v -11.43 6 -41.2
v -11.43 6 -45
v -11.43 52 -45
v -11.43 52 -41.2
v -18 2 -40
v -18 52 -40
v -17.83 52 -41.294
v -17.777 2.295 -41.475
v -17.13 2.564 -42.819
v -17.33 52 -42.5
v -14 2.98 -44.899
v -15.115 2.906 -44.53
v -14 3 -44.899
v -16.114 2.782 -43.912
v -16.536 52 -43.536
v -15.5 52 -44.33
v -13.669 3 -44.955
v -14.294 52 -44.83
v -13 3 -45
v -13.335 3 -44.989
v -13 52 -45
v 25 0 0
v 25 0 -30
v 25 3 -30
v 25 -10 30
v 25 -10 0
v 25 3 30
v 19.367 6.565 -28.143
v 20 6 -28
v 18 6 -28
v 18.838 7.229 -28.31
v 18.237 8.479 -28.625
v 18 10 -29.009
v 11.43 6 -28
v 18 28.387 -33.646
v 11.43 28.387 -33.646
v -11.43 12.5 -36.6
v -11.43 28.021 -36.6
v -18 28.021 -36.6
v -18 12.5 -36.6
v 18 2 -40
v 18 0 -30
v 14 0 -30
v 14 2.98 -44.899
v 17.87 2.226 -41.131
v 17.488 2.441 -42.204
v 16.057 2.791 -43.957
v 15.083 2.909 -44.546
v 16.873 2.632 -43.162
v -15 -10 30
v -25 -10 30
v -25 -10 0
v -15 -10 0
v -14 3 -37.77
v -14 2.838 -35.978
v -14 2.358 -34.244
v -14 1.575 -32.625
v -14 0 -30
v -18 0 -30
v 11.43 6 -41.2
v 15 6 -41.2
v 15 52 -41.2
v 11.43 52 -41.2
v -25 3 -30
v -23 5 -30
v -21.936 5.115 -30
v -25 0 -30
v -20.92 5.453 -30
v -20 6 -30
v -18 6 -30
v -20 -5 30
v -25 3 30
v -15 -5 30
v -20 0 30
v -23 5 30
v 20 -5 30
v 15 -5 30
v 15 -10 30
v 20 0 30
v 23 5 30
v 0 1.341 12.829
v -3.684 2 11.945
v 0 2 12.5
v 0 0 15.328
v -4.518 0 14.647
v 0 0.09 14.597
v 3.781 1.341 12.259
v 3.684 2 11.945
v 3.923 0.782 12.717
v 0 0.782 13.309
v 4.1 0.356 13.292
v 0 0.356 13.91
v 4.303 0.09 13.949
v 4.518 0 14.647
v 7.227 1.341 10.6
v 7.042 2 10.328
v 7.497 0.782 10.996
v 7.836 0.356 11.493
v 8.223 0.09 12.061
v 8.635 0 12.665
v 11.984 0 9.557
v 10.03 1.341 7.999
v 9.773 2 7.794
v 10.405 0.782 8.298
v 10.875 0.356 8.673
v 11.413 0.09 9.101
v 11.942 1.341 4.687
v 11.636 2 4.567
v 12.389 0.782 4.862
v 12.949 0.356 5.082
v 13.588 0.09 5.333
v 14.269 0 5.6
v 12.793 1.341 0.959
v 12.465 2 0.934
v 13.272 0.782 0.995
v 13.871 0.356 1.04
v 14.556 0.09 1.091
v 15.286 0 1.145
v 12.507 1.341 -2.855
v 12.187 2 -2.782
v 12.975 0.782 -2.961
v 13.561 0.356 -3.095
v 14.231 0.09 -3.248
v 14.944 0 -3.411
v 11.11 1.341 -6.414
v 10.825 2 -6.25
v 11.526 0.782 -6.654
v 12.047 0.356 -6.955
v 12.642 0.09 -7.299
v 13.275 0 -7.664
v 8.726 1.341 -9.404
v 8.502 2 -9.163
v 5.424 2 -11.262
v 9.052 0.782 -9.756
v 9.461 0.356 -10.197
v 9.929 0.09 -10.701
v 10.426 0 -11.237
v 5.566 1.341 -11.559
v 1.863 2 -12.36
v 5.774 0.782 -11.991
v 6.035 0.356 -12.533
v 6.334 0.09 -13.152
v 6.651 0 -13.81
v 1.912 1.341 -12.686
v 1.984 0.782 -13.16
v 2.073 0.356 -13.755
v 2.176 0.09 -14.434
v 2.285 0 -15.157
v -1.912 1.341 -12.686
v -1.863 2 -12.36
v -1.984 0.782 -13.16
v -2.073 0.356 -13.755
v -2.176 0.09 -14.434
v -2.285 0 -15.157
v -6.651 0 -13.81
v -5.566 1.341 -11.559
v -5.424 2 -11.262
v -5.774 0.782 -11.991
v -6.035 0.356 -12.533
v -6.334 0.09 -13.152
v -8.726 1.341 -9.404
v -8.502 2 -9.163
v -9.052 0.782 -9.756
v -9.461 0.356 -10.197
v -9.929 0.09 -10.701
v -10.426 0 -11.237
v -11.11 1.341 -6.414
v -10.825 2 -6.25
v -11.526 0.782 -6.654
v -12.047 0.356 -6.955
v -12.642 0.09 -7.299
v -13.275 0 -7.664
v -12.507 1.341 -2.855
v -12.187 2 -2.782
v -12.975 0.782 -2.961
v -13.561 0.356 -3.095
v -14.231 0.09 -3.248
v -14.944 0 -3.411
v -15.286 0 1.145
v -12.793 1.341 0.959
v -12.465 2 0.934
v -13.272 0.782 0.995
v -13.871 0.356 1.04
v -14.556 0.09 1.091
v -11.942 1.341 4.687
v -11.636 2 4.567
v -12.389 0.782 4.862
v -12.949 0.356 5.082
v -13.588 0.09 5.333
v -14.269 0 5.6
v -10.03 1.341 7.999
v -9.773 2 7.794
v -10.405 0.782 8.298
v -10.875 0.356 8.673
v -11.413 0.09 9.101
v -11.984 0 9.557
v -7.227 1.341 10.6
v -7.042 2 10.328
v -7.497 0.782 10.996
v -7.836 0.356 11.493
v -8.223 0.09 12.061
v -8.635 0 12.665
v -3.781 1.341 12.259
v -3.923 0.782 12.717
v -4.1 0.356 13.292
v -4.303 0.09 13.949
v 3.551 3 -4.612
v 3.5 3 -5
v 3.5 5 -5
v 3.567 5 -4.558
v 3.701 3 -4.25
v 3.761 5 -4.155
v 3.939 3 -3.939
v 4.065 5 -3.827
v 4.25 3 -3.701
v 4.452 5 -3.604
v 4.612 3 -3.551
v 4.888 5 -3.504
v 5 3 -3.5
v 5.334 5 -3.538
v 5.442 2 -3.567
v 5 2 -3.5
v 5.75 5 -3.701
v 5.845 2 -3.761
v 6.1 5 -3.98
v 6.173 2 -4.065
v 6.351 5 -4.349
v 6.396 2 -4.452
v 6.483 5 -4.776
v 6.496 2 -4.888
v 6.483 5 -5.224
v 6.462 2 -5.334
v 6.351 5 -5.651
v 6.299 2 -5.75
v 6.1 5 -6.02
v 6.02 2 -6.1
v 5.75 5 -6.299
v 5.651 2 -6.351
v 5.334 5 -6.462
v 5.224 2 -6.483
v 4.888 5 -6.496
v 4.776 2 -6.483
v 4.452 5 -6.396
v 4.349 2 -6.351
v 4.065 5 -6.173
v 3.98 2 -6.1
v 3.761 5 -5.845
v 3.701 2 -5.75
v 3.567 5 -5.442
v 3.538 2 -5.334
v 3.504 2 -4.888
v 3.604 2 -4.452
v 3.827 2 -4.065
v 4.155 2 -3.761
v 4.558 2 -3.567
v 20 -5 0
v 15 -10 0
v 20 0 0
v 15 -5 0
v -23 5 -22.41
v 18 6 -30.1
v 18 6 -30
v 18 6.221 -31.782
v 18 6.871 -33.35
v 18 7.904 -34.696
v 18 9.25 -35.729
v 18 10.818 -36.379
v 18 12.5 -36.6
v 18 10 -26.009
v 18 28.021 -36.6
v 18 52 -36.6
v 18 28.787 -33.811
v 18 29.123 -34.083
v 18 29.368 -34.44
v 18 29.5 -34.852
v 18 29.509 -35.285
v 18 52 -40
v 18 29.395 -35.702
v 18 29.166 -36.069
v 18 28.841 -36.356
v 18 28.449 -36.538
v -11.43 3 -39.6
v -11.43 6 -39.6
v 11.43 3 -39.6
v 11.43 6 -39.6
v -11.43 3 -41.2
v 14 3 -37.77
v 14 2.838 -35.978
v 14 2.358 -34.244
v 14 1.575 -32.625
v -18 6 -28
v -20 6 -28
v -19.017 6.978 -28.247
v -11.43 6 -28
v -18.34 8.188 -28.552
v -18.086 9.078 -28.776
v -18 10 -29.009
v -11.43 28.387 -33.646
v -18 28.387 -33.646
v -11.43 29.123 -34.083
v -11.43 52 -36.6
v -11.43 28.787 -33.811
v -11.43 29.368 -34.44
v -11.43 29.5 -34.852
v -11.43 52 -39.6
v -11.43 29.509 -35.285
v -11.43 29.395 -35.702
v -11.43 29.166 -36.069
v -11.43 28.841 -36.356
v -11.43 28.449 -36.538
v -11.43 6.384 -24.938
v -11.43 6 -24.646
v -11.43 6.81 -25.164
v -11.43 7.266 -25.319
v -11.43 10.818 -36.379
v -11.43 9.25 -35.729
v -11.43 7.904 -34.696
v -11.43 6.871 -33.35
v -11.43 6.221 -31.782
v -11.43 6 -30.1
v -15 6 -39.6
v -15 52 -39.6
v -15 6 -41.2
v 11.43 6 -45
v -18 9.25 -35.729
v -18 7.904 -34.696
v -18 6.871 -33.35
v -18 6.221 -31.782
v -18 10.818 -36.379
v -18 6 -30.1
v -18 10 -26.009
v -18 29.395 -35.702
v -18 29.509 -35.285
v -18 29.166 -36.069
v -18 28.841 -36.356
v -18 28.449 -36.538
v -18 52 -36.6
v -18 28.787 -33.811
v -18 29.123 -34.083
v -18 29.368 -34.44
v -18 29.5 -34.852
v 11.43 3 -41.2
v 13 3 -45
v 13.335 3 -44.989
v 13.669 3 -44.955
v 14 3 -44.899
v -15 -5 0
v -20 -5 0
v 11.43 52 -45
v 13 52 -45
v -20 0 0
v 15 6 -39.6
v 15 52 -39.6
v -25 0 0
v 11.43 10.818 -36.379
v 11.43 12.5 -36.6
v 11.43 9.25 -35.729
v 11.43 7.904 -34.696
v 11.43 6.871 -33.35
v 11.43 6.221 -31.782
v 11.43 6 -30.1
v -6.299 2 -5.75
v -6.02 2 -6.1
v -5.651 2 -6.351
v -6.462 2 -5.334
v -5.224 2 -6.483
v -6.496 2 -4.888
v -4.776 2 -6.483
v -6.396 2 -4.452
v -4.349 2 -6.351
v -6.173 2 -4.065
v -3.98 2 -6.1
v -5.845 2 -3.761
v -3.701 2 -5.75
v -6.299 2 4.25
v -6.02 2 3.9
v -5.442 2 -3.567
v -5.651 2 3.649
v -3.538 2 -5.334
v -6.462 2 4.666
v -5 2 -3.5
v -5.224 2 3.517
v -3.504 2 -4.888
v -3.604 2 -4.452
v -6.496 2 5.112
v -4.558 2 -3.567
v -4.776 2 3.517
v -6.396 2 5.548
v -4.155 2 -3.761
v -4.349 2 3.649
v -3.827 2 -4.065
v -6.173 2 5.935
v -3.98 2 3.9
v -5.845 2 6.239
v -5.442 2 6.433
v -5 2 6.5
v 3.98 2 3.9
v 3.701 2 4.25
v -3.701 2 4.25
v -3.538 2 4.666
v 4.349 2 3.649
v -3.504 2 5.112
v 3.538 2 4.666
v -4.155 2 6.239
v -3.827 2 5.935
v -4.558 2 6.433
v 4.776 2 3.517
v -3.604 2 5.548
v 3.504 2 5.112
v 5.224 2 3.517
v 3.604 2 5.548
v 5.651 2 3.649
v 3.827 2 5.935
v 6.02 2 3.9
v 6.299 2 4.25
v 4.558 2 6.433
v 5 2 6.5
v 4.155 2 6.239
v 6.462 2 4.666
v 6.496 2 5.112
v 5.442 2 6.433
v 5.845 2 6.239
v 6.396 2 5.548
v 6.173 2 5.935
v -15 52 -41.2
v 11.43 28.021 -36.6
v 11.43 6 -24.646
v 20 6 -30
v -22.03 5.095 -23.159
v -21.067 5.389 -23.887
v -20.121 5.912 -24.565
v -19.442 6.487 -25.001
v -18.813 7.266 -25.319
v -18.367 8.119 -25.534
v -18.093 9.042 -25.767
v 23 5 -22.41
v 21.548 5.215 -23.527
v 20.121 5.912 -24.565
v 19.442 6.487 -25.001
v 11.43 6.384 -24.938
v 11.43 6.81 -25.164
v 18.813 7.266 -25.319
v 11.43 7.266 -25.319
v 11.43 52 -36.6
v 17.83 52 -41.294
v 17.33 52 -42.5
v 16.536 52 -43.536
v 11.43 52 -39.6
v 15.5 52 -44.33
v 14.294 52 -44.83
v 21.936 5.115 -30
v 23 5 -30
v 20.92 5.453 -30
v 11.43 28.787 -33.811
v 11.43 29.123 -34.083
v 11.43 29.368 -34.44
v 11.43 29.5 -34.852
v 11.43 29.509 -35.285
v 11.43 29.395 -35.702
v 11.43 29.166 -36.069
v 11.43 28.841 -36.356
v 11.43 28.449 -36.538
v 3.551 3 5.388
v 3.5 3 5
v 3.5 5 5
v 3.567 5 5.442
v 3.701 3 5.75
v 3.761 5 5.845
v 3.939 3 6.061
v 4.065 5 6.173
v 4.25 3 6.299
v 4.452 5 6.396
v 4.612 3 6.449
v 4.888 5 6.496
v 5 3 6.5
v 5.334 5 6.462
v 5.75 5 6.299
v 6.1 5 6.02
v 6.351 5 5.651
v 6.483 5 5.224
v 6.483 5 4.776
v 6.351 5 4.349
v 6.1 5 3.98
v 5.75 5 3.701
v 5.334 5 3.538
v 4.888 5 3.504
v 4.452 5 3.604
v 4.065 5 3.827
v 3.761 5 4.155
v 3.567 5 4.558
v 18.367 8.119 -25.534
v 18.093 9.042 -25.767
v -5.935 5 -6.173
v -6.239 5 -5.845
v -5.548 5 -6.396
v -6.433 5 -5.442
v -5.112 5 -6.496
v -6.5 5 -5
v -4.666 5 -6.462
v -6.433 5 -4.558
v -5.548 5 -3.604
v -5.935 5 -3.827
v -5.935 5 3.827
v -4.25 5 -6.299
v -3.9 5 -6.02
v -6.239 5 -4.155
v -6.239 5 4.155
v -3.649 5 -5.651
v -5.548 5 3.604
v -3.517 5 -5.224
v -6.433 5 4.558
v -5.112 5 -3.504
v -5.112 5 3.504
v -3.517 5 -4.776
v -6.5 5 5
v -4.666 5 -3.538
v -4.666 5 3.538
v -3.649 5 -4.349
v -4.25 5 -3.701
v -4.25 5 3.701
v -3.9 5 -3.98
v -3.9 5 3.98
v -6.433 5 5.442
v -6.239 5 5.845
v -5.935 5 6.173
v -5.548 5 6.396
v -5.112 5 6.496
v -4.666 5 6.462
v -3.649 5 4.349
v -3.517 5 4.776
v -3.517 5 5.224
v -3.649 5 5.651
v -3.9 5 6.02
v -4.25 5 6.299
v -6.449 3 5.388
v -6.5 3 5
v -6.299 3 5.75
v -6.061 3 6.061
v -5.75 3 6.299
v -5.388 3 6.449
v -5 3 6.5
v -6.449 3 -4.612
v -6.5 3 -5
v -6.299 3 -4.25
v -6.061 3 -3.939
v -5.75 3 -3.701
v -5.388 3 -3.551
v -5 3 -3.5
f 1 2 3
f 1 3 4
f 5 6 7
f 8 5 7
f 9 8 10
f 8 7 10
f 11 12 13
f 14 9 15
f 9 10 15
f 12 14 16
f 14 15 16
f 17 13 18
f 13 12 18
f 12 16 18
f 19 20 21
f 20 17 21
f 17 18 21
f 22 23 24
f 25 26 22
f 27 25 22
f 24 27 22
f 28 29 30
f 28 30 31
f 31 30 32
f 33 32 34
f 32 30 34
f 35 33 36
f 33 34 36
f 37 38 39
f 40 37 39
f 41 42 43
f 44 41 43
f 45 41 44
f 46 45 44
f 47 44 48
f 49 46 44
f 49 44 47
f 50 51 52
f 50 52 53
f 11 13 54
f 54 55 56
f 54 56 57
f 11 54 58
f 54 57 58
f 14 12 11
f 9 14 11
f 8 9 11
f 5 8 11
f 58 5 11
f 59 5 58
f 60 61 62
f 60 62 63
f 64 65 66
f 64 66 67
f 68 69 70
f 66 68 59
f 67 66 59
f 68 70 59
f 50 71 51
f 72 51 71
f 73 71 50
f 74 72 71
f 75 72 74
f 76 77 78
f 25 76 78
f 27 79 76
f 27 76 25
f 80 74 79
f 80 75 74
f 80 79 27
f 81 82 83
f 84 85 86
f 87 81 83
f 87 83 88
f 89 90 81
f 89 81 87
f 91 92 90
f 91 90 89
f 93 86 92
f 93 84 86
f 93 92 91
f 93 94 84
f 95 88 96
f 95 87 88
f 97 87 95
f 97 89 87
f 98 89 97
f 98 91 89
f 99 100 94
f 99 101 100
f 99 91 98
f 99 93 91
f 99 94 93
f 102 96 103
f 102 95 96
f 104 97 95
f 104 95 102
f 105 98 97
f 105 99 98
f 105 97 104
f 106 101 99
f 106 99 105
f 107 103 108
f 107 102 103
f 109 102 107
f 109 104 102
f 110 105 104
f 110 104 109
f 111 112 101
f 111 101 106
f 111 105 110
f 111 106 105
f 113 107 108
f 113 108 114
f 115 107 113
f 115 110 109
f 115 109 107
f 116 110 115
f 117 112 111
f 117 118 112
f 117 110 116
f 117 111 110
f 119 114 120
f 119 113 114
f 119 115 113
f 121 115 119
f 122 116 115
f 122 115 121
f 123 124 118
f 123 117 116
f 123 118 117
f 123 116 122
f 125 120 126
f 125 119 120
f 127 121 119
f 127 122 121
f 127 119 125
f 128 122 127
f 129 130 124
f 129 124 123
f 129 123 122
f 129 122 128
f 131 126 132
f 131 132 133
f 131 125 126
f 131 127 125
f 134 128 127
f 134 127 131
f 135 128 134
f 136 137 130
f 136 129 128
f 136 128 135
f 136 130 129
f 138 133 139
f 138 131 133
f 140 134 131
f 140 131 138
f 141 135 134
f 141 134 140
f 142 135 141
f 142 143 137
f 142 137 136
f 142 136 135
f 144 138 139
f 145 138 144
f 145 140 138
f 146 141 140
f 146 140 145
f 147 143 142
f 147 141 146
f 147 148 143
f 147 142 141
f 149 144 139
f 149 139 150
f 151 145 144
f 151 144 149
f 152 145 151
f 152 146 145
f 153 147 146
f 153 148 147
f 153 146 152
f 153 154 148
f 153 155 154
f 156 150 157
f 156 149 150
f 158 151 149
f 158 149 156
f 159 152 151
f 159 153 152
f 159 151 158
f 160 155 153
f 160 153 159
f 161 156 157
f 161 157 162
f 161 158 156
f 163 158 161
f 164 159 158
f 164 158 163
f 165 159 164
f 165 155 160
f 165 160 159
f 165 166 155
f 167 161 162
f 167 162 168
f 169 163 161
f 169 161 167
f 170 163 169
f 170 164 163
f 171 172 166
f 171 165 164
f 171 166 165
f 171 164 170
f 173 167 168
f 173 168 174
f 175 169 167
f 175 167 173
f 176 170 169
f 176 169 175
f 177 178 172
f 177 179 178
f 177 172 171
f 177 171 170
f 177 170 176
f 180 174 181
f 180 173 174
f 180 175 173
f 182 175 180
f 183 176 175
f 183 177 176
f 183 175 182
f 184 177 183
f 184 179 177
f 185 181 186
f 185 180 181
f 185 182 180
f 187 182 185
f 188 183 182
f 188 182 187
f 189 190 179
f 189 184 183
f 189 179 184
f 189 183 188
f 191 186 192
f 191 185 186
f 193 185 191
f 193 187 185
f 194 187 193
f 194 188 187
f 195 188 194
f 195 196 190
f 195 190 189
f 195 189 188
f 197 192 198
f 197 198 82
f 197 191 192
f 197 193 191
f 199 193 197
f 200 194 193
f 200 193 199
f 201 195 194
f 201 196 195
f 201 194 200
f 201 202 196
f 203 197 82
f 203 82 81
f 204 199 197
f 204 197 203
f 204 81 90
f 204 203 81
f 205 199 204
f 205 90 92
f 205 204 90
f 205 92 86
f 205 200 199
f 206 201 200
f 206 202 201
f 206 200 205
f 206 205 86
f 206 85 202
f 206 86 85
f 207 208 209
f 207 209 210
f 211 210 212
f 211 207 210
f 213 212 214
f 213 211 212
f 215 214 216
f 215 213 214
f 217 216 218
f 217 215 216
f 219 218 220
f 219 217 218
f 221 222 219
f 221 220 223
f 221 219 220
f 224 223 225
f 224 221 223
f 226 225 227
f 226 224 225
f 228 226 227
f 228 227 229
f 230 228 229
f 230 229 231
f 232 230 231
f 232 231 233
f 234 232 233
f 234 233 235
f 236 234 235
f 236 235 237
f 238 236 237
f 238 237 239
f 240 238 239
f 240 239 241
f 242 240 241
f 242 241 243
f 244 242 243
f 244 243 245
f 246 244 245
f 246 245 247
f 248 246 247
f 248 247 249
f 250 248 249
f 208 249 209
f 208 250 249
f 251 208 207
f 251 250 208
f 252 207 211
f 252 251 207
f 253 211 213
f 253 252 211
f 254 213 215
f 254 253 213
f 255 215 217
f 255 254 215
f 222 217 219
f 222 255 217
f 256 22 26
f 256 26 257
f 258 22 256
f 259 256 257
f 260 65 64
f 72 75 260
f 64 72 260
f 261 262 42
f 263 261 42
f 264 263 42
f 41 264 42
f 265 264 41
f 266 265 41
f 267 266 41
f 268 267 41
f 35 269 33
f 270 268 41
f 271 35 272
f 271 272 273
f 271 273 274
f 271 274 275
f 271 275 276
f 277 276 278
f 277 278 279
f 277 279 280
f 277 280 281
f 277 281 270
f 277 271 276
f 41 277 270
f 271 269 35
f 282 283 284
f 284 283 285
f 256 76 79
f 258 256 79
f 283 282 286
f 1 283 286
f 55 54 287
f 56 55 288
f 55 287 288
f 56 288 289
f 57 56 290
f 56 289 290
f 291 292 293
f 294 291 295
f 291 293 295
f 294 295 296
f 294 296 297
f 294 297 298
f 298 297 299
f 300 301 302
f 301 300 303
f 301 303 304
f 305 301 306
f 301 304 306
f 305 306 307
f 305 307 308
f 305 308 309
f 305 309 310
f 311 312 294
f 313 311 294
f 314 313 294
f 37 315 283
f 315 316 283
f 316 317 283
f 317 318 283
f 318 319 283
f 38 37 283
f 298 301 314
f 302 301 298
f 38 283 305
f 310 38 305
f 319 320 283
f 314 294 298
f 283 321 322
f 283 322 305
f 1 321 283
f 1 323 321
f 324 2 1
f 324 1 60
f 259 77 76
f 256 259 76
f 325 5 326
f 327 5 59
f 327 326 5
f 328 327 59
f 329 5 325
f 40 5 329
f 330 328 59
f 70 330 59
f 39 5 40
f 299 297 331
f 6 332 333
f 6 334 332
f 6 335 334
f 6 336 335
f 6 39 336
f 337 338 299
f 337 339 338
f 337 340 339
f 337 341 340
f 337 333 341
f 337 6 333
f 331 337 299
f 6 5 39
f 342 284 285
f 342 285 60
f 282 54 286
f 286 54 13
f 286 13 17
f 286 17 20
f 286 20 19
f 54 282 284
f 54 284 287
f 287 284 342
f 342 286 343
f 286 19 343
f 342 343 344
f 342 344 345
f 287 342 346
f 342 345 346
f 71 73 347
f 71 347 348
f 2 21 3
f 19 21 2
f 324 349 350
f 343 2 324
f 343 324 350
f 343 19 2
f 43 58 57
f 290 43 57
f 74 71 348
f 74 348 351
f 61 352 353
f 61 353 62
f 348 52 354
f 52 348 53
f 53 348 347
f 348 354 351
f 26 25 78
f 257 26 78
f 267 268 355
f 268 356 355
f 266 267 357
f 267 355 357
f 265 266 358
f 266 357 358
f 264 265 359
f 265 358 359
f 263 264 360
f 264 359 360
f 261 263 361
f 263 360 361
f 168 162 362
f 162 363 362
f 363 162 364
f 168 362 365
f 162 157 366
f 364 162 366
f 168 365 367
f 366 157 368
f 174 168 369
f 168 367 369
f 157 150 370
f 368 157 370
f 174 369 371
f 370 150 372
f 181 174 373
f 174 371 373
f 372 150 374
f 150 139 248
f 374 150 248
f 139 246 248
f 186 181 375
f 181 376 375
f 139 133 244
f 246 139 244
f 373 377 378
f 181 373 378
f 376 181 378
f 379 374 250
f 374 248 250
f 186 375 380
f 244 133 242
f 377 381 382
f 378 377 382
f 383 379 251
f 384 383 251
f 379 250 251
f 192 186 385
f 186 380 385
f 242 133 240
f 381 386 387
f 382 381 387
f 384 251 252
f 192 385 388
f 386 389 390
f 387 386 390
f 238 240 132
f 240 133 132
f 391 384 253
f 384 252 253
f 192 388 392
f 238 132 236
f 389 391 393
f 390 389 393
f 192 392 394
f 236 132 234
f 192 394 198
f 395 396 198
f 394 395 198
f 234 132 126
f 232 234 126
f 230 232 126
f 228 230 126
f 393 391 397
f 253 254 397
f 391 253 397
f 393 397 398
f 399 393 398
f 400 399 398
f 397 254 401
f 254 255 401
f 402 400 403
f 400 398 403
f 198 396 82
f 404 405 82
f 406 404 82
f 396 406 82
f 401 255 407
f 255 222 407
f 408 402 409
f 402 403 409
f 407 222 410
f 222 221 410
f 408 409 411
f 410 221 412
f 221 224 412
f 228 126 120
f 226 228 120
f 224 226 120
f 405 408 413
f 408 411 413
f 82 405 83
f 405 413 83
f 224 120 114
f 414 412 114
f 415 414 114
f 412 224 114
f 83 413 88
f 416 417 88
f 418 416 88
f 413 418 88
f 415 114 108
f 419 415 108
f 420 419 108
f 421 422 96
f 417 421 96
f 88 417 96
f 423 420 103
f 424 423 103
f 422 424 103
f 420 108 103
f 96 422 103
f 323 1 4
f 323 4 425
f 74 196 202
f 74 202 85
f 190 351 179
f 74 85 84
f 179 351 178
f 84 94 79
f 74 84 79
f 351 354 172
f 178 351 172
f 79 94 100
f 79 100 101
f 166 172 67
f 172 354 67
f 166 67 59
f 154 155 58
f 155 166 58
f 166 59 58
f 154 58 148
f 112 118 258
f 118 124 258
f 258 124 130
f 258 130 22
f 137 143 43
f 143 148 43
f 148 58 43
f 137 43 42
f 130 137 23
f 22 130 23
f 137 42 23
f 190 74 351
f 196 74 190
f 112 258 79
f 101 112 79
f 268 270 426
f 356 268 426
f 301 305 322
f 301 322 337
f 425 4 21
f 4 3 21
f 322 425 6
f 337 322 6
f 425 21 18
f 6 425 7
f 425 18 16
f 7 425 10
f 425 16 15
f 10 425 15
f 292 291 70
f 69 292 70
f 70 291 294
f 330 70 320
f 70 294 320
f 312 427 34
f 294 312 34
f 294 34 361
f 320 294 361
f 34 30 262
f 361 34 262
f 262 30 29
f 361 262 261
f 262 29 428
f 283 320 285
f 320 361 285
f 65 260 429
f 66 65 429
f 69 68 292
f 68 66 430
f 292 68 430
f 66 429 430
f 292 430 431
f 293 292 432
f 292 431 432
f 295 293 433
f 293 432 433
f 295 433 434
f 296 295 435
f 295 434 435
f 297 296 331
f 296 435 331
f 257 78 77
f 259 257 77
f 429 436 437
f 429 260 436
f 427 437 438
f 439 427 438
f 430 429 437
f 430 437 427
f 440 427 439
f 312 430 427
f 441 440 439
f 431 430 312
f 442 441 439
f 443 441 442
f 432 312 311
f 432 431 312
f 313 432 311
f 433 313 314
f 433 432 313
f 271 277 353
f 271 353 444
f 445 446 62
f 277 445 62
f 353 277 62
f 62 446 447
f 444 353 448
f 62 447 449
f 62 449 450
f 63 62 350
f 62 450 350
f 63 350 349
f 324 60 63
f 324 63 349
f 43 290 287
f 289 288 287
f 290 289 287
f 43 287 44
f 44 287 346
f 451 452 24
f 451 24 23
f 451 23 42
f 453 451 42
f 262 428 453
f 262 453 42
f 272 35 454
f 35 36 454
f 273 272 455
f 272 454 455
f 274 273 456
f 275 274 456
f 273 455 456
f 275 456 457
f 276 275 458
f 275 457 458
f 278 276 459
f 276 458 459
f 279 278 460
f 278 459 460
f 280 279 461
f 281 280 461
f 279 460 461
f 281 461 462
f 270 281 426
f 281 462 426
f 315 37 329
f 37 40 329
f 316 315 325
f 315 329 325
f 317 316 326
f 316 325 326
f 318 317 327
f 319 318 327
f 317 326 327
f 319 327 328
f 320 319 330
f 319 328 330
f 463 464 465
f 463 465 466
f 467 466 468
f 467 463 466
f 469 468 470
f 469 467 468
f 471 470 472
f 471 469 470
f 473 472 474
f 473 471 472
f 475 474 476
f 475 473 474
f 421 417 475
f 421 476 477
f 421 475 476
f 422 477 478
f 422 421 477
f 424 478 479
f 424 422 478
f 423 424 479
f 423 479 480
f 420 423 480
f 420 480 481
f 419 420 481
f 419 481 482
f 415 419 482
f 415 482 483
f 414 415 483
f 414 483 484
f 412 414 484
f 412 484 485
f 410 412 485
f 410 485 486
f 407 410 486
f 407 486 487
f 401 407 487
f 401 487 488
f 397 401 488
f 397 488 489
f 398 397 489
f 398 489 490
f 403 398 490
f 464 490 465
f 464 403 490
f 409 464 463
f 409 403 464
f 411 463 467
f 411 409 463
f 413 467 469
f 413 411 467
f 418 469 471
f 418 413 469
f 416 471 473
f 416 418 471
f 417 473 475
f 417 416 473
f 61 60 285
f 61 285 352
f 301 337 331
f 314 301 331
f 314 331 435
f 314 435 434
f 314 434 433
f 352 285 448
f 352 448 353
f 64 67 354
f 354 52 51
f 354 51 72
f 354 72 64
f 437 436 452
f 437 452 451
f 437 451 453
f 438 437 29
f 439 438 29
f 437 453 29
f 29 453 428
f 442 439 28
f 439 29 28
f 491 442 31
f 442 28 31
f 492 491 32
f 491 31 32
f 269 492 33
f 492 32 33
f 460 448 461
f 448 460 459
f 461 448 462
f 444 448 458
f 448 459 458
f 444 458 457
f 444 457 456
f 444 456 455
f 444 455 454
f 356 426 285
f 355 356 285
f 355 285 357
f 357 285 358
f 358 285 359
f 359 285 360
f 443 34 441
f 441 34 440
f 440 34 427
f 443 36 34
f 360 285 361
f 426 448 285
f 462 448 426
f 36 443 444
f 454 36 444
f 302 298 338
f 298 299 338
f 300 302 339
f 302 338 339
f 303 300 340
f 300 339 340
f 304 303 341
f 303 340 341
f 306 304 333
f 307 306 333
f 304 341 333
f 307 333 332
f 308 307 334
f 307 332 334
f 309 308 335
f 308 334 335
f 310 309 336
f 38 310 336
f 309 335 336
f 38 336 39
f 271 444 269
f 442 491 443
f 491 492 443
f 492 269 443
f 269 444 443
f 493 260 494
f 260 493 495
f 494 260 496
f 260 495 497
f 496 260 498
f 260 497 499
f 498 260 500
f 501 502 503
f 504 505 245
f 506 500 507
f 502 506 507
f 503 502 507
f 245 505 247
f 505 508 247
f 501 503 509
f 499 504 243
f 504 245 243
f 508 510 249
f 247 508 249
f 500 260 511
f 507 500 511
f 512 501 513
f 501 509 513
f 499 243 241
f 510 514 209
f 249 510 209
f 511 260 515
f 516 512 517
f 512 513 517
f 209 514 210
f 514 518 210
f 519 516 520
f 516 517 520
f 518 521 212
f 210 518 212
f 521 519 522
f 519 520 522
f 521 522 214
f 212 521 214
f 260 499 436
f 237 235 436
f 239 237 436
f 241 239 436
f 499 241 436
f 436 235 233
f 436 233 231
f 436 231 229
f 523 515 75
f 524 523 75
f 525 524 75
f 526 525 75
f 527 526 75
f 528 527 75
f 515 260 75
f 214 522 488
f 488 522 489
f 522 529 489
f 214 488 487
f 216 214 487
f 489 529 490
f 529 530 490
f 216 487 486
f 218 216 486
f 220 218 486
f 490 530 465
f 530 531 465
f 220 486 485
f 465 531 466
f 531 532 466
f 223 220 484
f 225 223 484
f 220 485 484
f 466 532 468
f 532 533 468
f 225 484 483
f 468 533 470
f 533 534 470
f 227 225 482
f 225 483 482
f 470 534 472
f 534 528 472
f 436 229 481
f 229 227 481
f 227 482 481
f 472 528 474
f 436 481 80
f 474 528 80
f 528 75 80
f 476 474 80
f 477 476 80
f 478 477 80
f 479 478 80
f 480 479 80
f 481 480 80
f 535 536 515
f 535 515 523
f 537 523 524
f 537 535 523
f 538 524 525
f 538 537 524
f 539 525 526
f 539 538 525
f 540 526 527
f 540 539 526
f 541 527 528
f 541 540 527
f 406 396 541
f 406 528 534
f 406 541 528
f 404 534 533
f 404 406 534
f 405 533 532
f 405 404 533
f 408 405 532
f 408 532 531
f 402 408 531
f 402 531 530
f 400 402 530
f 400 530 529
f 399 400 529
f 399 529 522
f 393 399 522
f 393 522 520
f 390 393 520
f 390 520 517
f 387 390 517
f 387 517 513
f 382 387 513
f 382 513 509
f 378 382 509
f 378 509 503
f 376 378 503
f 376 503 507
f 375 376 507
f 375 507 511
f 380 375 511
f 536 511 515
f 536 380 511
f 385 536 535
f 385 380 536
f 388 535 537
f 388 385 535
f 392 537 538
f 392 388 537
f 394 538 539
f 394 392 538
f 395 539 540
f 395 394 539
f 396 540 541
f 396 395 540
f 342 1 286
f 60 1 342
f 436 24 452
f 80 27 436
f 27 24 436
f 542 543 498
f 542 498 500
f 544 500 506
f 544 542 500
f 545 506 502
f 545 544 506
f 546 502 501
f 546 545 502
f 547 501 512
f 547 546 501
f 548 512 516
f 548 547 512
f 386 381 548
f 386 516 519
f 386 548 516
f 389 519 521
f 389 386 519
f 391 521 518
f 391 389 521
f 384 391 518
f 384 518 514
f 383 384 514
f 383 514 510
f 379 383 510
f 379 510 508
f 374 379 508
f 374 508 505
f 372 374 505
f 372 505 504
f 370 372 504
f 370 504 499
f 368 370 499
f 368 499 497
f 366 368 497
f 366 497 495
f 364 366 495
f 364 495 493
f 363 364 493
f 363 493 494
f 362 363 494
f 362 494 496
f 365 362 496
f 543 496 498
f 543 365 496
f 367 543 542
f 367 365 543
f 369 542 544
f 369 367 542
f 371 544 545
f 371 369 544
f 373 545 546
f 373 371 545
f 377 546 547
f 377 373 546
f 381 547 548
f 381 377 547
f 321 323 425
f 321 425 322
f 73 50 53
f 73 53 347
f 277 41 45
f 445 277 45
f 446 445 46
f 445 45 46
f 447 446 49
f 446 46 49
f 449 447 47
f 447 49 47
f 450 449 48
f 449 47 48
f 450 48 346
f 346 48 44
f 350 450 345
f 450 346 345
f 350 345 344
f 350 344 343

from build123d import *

# Parameters (mm, degrees)
SKETCH_2_W          = 60
SKETCH_2_H          = 60
EXTRUDE_1_DEPTH     = 3
SKETCH_3_R          = 1.5
CUT_EXTRUDE_1_DEPTH = 3
EXTRUDE_START       = 30
EXTRUDE_3_DEPTH     = 30
EXTRUDE_START_2     = 3
SKETCH_8_W          = 36
SKETCH_8_H          = 20
EXTRUDE_4_DEPTH     = 3
CUT_EXTRUDE_START   = 6
SKETCH_10_W         = 22.86
SKETCH_10_H         = 1.6
CUT_EXTRUDE_2_DEPTH = 3
EXTRUDE_START_3     = 6
EXTRUDE_5_DEPTH     = 46
EXTRUDE_START_4     = -18
EXTRUDE_6_DEPTH     = 36
EXTRUDE_START_5     = 18
EXTRUDE_8_DEPTH     = 6.57
EXTRUDE_START_6     = -11.43
EXTRUDE_9_DEPTH     = 6.57
EXTRUDE_10_DEPTH    = 36
SKETCH_16_W         = 5
SKETCH_16_H         = 60
CUT_EXTRUDE_3_DEPTH = 3
EXTRUDE_11_DEPTH    = 4
EXTRUDE_12_DEPTH    = 4
FILLET_3_R          = 5
FILLET_4_R          = 10
SKETCH_22_W         = 50
SKETCH_22_H         = 2
EXTRUDE_14_DEPTH    = 60
CUT_EXTRUDE_START_2 = 30
CUT_EXTRUDE_4_DEPTH = 60
SKETCH_25_R         = 1.5
CUT_EXTRUDE_5_DEPTH = 5
SKETCH_26_R         = 12.5
CUT_EXTRUDE_6_DEPTH = 2
FILLET_5_R          = 3
FILLET_7_R          = 5
FILLET_8_R          = 6.5
FILLET_9_R          = 1.5
FILLET_10_R         = 3


with BuildPart() as part:
    # 草图2 → 凸台-拉伸1 (new body)
    with BuildSketch(Plane(origin=(0, 0, 0), x_dir=(1, 0, 0), z_dir=(0, 1, 0))):
        Rectangle(SKETCH_2_W, SKETCH_2_H)
    extrude(amount=EXTRUDE_1_DEPTH)

    # 草图3 → 切除-拉伸1 (cut)
    with BuildSketch(Plane(origin=(0, 0, 0), x_dir=(1, 0, 0), z_dir=(0, 1, 0))):
        with Locations(Location((-5, -5, 0), (0, 0, 270))):
            Circle(SKETCH_3_R)
        with Locations(Location((5, -5, 0), (0, 0, 270))):
            Circle(SKETCH_3_R)
        with Locations(Location((5, 5, 0), (0, 0, 270))):
            Circle(SKETCH_3_R)
        with Locations(Location((-5, 5, 0), (0, 0, 270))):
            Circle(SKETCH_3_R)
    extrude(amount=CUT_EXTRUDE_1_DEPTH, mode=Mode.SUBTRACT)

    # 草图7 → 凸台-拉伸3 (add)
    with BuildSketch(Plane.XY.offset(EXTRUDE_START)):
        Polygon((-25, 0), (-25, -10), (-15, -10), (-15, -5), (-20, -5), (-20, 0), align=None)
        Polygon((20, 0), (25, 0), (25, -10), (15, -10), (15, -5), (20, -5), align=None)
    extrude(amount=-EXTRUDE_3_DEPTH)

    # 草图8 → 凸台-拉伸4 (add)
    with BuildSketch(Plane(origin=(0, 0, 0), x_dir=(1, 0, 0), z_dir=(0, 1, 0)).offset(EXTRUDE_START_2)):
        with Locations((0, 35)):
            Rectangle(SKETCH_8_W, SKETCH_8_H)
    extrude(amount=EXTRUDE_4_DEPTH)

    # 草图10 → 切除-拉伸2 (cut)
    with BuildSketch(Plane(origin=(0, 0, 0), x_dir=(1, 0, 0), z_dir=(0, 1, 0)).offset(CUT_EXTRUDE_START)):
        with Locations((0, 40.4)):
            Rectangle(SKETCH_10_W, SKETCH_10_H)
    extrude(amount=-CUT_EXTRUDE_2_DEPTH, mode=Mode.SUBTRACT)

    # 草图11 → 凸台-拉伸5 (add)
    with BuildSketch(Plane(origin=(0, 0, 0), x_dir=(1, 0, 0), z_dir=(0, 1, 0)).offset(EXTRUDE_START_3)):
        Polygon((11.43, 41.2), (11.43, 45), (18, 45), (18, 36.6), (11.43, 36.6), (11.43, 39.6), (15, 39.6), (15, 41.2), align=None)
        Polygon((-15, 41.2), (-15, 39.6), (-11.43, 39.6), (-11.43, 36.6), (-18, 36.6), (-18, 45), (-11.43, 45), (-11.43, 41.2), align=None)
    extrude(amount=EXTRUDE_5_DEPTH)

    # 草图12 → 凸台-拉伸6 (add)
    with BuildSketch(Plane(origin=(0, 0, 0), x_dir=(0, 0, -1), z_dir=(1, 0, 0)).offset(EXTRUDE_START_4)):
        Polygon((30, 0), (35, 3), (30, 3), align=None)
    extrude(amount=EXTRUDE_6_DEPTH)

    # 草图13 → 凸台-拉伸8 (add)
    with BuildSketch(Plane(origin=(0, 0, 0), x_dir=(0, 0, -1), z_dir=(1, 0, 0)).offset(EXTRUDE_START_5)):
        Polygon((25, 6), (36.6, 52), (36.6, 40.103448276), (28, 6), align=None)
    extrude(amount=-EXTRUDE_8_DEPTH)

    # 草图14 → 凸台-拉伸9 (add)
    with BuildSketch(Plane(origin=(0, 0, 0), x_dir=(0, 0, -1), z_dir=(1, 0, 0)).offset(EXTRUDE_START_6)):
        Polygon((36.6, 52), (25, 6), (28, 6), (36.6, 40.103448276), align=None)
    extrude(amount=-EXTRUDE_9_DEPTH)

    # 草图15 → 凸台-拉伸10 (add)
    with BuildSketch(Plane(origin=(0, 0, 0), x_dir=(0, 0, -1), z_dir=(1, 0, 0)).offset(EXTRUDE_START_4)):
        Polygon((25, 3), (24.243478261, 3), (25, 6), align=None)
    extrude(amount=EXTRUDE_10_DEPTH)

    # 草图16 → 切除-拉伸3 (cut)
    with BuildSketch(Plane(origin=(0, 0, 0), x_dir=(1, 0, 0), z_dir=(0, 1, 0))):
        with Locations((27.5, 0)):
            Rectangle(SKETCH_16_W, SKETCH_16_H)
        with Locations((-27.5, 0)):
            Rectangle(SKETCH_16_W, SKETCH_16_H)
    extrude(amount=CUT_EXTRUDE_3_DEPTH, mode=Mode.SUBTRACT)

    # 草图17 → 凸台-拉伸11 (add)
    with BuildSketch(Plane(origin=(0, 0, 0), x_dir=(0, 0, -1), z_dir=(1, 0, 0)).offset(EXTRUDE_START_5)):
        Polygon((30, 0), (45, 3), (30, 3), align=None)
    extrude(amount=-EXTRUDE_11_DEPTH)

    # 草图18 → 凸台-拉伸12 (add)
    with BuildSketch(Plane(origin=(0, 0, 0), x_dir=(0, 0, -1), z_dir=(1, 0, 0)).offset(EXTRUDE_START_4)):
        Polygon((30, 0), (30, 3), (45, 3), align=None)
    extrude(amount=EXTRUDE_12_DEPTH)

    # 圆角3
    # the kernel refuses this fillet: 5 mm, written as the material it takes off along each edge
    with BuildSketch(Plane(origin=(18, -9.5, -45), x_dir=(0, 0, 1), z_dir=(0, 1, 0)), Plane(origin=(-18, 64.5, -45), x_dir=(0, 0, 1), z_dir=(0, -1, 0))) as fillet_3_piece_1:
        with BuildLine():
            CenterArc((FILLET_3_R, -FILLET_3_R), FILLET_3_R, 90, 90)
            Line((0, -FILLET_3_R), (0, 0))
            Line((0, 0), (FILLET_3_R, 0))
        make_face()
    extrude(amount=74, mode=Mode.SUBTRACT)

    # 圆角4
    fillet_4_edges = [part.edges().sort_by_distance(p)[0] for p in [
        (0, 3, -35),
    ]]
    fillet(fillet_4_edges, radius=FILLET_4_R)

    # 草图22 → 凸台-拉伸14 (add)
    with BuildSketch(Plane.XY.offset(EXTRUDE_START)):
        with Locations((0, 4)):
            Rectangle(SKETCH_22_W, SKETCH_22_H)
    extrude(amount=-EXTRUDE_14_DEPTH)

    # 草图24 → 切除-拉伸4 (cut)
    with BuildSketch(Plane.XY.offset(CUT_EXTRUDE_START_2)):
        Polygon((-25, 5), (-23, 5), (-25, 3), align=None)
        Polygon((25, 5), (25, 3), (23, 5), align=None)
    extrude(amount=-CUT_EXTRUDE_4_DEPTH, mode=Mode.SUBTRACT)

    # 草图25 → 切除-拉伸5 (cut)
    with BuildSketch(Plane(origin=(0, 0, 0), x_dir=(1, 0, 0), z_dir=(0, 1, 0))):
        with Locations(Location((-5, 5, 0), (0, 0, 180))):
            Circle(SKETCH_25_R)
        with Locations(Location((5, 5, 0), (0, 0, 180))):
            Circle(SKETCH_25_R)
        with Locations(Location((5, -5, 0), (0, 0, 180))):
            Circle(SKETCH_25_R)
        with Locations(Location((-5, -5, 0), (0, 0, 180))):
            Circle(SKETCH_25_R)
    extrude(amount=CUT_EXTRUDE_5_DEPTH, mode=Mode.SUBTRACT)

    # 草图26 → 切除-拉伸6 (cut)
    with BuildSketch(Plane(origin=(0, 0, 0), x_dir=(1, 0, 0), z_dir=(0, 1, 0))):
        with Locations(Location((0, 0, 0), (0, 0, 270))):
            Circle(SKETCH_26_R)
    extrude(amount=CUT_EXTRUDE_6_DEPTH, mode=Mode.SUBTRACT)

    # 圆角5
    # the kernel refuses this fillet: 3 mm, written as the material it takes off along each edge
    with BuildSketch(Plane(origin=(0, 0, 0), x_dir=(0, 0, 1), z_dir=(-1, 0, 0))) as fillet_5_piece_1:
        with BuildLine():
            CenterArc((15.328427125, 3), FILLET_5_R, 199.471220634, 70.528779366)
            Line((15.328427125, 0), (15.328427125, -0.06))
            Line((15.328427125, -0.06), (12.5, -0.06))
            Line((12.5, -0.06), (12.44, 0))
            ThreePointArc((12.44, 0), (12.44, 1), (12.443431458, 1.98))
            Line((12.443431458, 1.98), (12.5, 2))
        make_face()
    revolve(axis=Axis((0, 0, 0), (0, 1, 0)), mode=Mode.SUBTRACT)

    # 圆角7
    # the kernel refuses this fillet: 5 mm, written as the material it adds along each edge
    with BuildSketch(Plane(origin=(-18, 5, -12.247826087), x_dir=(0, 1, 0), z_dir=(0, 0, -1))) as fillet_7_piece_1_section:
        with BuildLine():
            CenterArc((FILLET_7_R, -FILLET_7_R), FILLET_7_R, 90, 90)
            Line((0, -FILLET_7_R), (0, 0))
            Line((0, 0), (FILLET_7_R, 0))
        make_face()
    fillet_7_piece_1 = extrude(amount=30.252173913, mode=Mode.PRIVATE)
    fillet_7_piece_1 = split(fillet_7_piece_1, bisect_by=Plane(origin=(-18.571810287, 7.311264389, -25.330666672), z_dir=(0, -0.24451904524274018, -0.9696444897556934)), keep=Keep.TOP, mode=Mode.PRIVATE)
    fillet_7_piece_1 = split(fillet_7_piece_1, bisect_by=Plane(origin=(-18.571810287, 6.599974755, -28.151297982), z_dir=(0, 0.24451904524274015, 0.9696444897556934)), keep=Keep.TOP, mode=Mode.PRIVATE)
    add(fillet_7_piece_1)
    with BuildSketch(Plane(origin=(-18, 5, -12.247826087), x_dir=(0, 1, 0), z_dir=(0, 0, -1))) as fillet_7_piece_2_section:
        with BuildLine():
            CenterArc((FILLET_7_R, -FILLET_7_R), FILLET_7_R, 90, 90)
            Line((0, -FILLET_7_R), (0, 0))
            Line((0, 0), (FILLET_7_R, 0))
        make_face()
    fillet_7_piece_2 = extrude(amount=17.752173913, mode=Mode.PRIVATE)
    fillet_7_piece_2 = split(fillet_7_piece_2, bisect_by=Plane(origin=(-19.572975188, 6, -28.927333211), z_dir=(0, -1, 0)), keep=Keep.TOP, mode=Mode.PRIVATE)
    fillet_7_piece_2 = split(fillet_7_piece_2, bisect_by=Plane(origin=(-19.572975188, 5.678002788, -27.918800703), z_dir=(0, -0.24451904524274015, -0.9696444897556934)), keep=Keep.TOP, mode=Mode.PRIVATE)
    add(fillet_7_piece_2)
    with BuildSketch(Plane(origin=(18, 5, -30), x_dir=(1, 0, 0), z_dir=(0, 0, 1))) as fillet_7_piece_3_section:
        with BuildLine():
            CenterArc((FILLET_7_R, FILLET_7_R), FILLET_7_R, 180, 90)
            Line((0, FILLET_7_R), (0, 0))
            Line((0, 0), (FILLET_7_R, 0))
        make_face()
    fillet_7_piece_3 = extrude(amount=17.752173913, mode=Mode.PRIVATE)
    fillet_7_piece_3 = split(fillet_7_piece_3, bisect_by=Plane(origin=(19.572975189, 6, -28.92733321), z_dir=(0, -1, 0)), keep=Keep.TOP, mode=Mode.PRIVATE)
    fillet_7_piece_3 = split(fillet_7_piece_3, bisect_by=Plane(origin=(19.572975189, 6.389292423, -25.098169394), z_dir=(0, -0.24451904524274018, -0.9696444897556934)), keep=Keep.TOP, mode=Mode.PRIVATE)
    add(fillet_7_piece_3)
    with BuildSketch(Plane(origin=(18, 5, -42.5), x_dir=(1, 0, 0), z_dir=(0, 0, 1))) as fillet_7_piece_4_section:
        with BuildLine():
            CenterArc((FILLET_7_R, FILLET_7_R), FILLET_7_R, 180, 90)
            Line((0, FILLET_7_R), (0, 0))
            Line((0, 0), (FILLET_7_R, 0))
        make_face()
    fillet_7_piece_4 = extrude(amount=30.252173913, mode=Mode.PRIVATE)
    fillet_7_piece_4 = split(fillet_7_piece_4, bisect_by=Plane(origin=(18.571810287, 7.311264389, -25.330666672), z_dir=(0, -0.24451904524274018, -0.9696444897556934)), keep=Keep.TOP, mode=Mode.PRIVATE)
    fillet_7_piece_4 = split(fillet_7_piece_4, bisect_by=Plane(origin=(18.571810287, 6.599974754, -28.151297982), z_dir=(0, 0.24451904524274015, 0.9696444897556934)), keep=Keep.TOP, mode=Mode.PRIVATE)
    add(fillet_7_piece_4)

    # 圆角8
    fillet_8_edges = [part.edges().sort_by_distance(p)[0] for p in [
        (-14.715, 6, -36.6),
        (14.715, 6, -36.6),
    ]]
    fillet(fillet_8_edges, radius=FILLET_8_R)

    # 圆角9
    fillet_9_edges = [part.edges().sort_by_distance(p)[0] for p in [
        (14.715, 40.103448276, -36.6),
        (-14.715, 40.103448276, -36.6),
    ]]
    fillet(fillet_9_edges, radius=FILLET_9_R)

    # 圆角10
    # the kernel refuses this fillet: 3 mm, written as the material it adds along each edge
    with BuildSketch(Plane(origin=(-28.843489259, 5, -24.747826087), x_dir=(-2.8138525512499648e-15, 0.9696444897556498, -0.24451904524291254), z_dir=(1, 0, 0))) as fillet_10_piece_1_section:
        with BuildLine():
            CenterArc((FILLET_10_R * 0.779131901165, FILLET_10_R), FILLET_10_R, 194.153412588, 75.846587412)
            Line((-FILLET_10_R * 0.190512588591, FILLET_10_R * 0.755480954757), (0, 0))
            Line((0, 0), (FILLET_10_R * 0.779131901165, 0))
        make_face()
    fillet_10_piece_1 = extrude(amount=57.686978517, mode=Mode.PRIVATE)
    fillet_10_piece_1 = split(fillet_10_piece_1, bisect_by=Plane(origin=(-16.50607505, 6, -24.188979992), z_dir=(0, -1, 0)), keep=Keep.TOP, mode=Mode.PRIVATE)
    fillet_10_piece_1 = fillet_10_piece_1 - Plane(origin=(-23, 10, -24.188979992), x_dir=(0, 1, 0), z_dir=(0, 0, 1)) * Cylinder(5, 125, mode=Mode.PRIVATE)
    fillet_10_piece_1 = split(fillet_10_piece_1, bisect_by=Plane(origin=(-11.43, 5.296453609, -24.188979992), z_dir=(-1, 0, 0)), keep=Keep.TOP, mode=Mode.PRIVATE)
    fillet_10_piece_1 = split(fillet_10_piece_1, bisect_by=Plane(origin=(-19.60481072, 8.39518928, -24.188979992), z_dir=(0.7071067811865488, -0.7071067811865462, 0)), keep=Keep.TOP, mode=Mode.PRIVATE)
    add(fillet_10_piece_1)
    with BuildSketch(Plane(origin=(-28.843489259, 5, -24.747826087), x_dir=(-2.8138525512499648e-15, 0.9696444897556498, -0.24451904524291254), z_dir=(1, 0, 0))) as fillet_10_piece_2_section:
        with BuildLine():
            CenterArc((FILLET_10_R * 0.779131901165, FILLET_10_R), FILLET_10_R, 194.153412588, 75.846587412)
            Line((-FILLET_10_R * 0.190512588591, FILLET_10_R * 0.755480954757), (0, 0))
            Line((0, 0), (FILLET_10_R * 0.779131901165, 0))
        make_face()
    fillet_10_piece_2 = extrude(amount=57.686978517, mode=Mode.PRIVATE)
    fillet_10_piece_2 = split(fillet_10_piece_2, bisect_by=Plane(origin=(-15.490459674, 6, -25.045388179), z_dir=(0, 1, 0)), keep=Keep.TOP, mode=Mode.PRIVATE)
    fillet_10_piece_2 = fillet_10_piece_2 - Plane(origin=(-23, 10, -25.045388179), x_dir=(0, 1, 0), z_dir=(0, 0, 1)) * Cylinder(5, 125, mode=Mode.PRIVATE)
    fillet_10_piece_2 = split(fillet_10_piece_2, bisect_by=Plane(origin=(-11.43, 6.408777733, -25.045388179), z_dir=(-1, 0, 0)), keep=Keep.TOP, mode=Mode.PRIVATE)
    fillet_10_piece_2 = split(fillet_10_piece_2, bisect_by=Plane(origin=(-18.54084097, 9.45915903, -25.045388179), z_dir=(0.7071067811865488, -0.7071067811865462, 0)), keep=Keep.TOP, mode=Mode.PRIVATE)
    add(fillet_10_piece_2)
    with BuildSketch(Plane(origin=(-28.843489259, 5, -24.747826087), x_dir=(-2.8138525512499648e-15, 0.9696444897556498, -0.24451904524291254), z_dir=(1, 0, 0))) as fillet_10_piece_3_section:
        with BuildLine():
            CenterArc((FILLET_10_R * 0.779131901165, FILLET_10_R), FILLET_10_R, 194.153412588, 75.846587412)
            Line((-FILLET_10_R * 0.190512588591, FILLET_10_R * 0.755480954757), (0, 0))
            Line((0, 0), (FILLET_10_R * 0.779131901165, 0))
        make_face()
    fillet_10_piece_3 = extrude(amount=57.686978517, mode=Mode.PRIVATE)
    fillet_10_piece_3 = split(fillet_10_piece_3, bisect_by=Plane(origin=(0, 6, -24.222418931), z_dir=(0, -1, 0)), keep=Keep.TOP, mode=Mode.PRIVATE)
    fillet_10_piece_3 = split(fillet_10_piece_3, bisect_by=Plane(origin=(-11.43, 5.321349944, -24.222418931), z_dir=(1, 0, 0)), keep=Keep.TOP, mode=Mode.PRIVATE)
    fillet_10_piece_3 = split(fillet_10_piece_3, bisect_by=Plane(origin=(11.43, 5.321349944, -24.222418931), z_dir=(-1, 0, 0)), keep=Keep.TOP, mode=Mode.PRIVATE)
    add(fillet_10_piece_3)
    with BuildSketch(Plane(origin=(-28.843489259, 5, -24.747826087), x_dir=(-2.8138525512499648e-15, 0.9696444897556498, -0.24451904524291254), z_dir=(1, 0, 0))) as fillet_10_piece_4_section:
        with BuildLine():
            CenterArc((FILLET_10_R * 0.779131901165, FILLET_10_R), FILLET_10_R, 194.153412588, 75.846587412)
            Line((-FILLET_10_R * 0.190512588591, FILLET_10_R * 0.755480954757), (0, 0))
            Line((0, 0), (FILLET_10_R * 0.779131901165, 0))
        make_face()
    fillet_10_piece_4 = extrude(amount=57.686978517, mode=Mode.PRIVATE)
    fillet_10_piece_4 = split(fillet_10_piece_4, bisect_by=Plane(origin=(16.50607505, 6, -24.188979992), z_dir=(0, -1, 0)), keep=Keep.TOP, mode=Mode.PRIVATE)
    fillet_10_piece_4 = fillet_10_piece_4 - Plane(origin=(23, 10, -24.188979992), x_dir=(1, 0, 0), z_dir=(0, 0, -1)) * Cylinder(5, 125, mode=Mode.PRIVATE)
    fillet_10_piece_4 = split(fillet_10_piece_4, bisect_by=Plane(origin=(11.43, 5.296453609, -24.188979992), z_dir=(1, 0, 0)), keep=Keep.TOP, mode=Mode.PRIVATE)
    fillet_10_piece_4 = split(fillet_10_piece_4, bisect_by=Plane(origin=(19.60481072, 8.39518928, -24.188979992), z_dir=(-0.7071067811865306, -0.7071067811865644, 0)), keep=Keep.TOP, mode=Mode.PRIVATE)
    add(fillet_10_piece_4)
    with BuildSketch(Plane(origin=(-28.843489259, 5, -24.747826087), x_dir=(-2.8138525512499648e-15, 0.9696444897556498, -0.24451904524291254), z_dir=(1, 0, 0))) as fillet_10_piece_5_section:
        with BuildLine():
            CenterArc((FILLET_10_R * 0.779131901165, FILLET_10_R), FILLET_10_R, 194.153412588, 75.846587412)
            Line((-FILLET_10_R * 0.190512588591, FILLET_10_R * 0.755480954757), (0, 0))
            Line((0, 0), (FILLET_10_R * 0.779131901165, 0))
        make_face()
    fillet_10_piece_5 = extrude(amount=57.686978517, mode=Mode.PRIVATE)
    fillet_10_piece_5 = split(fillet_10_piece_5, bisect_by=Plane(origin=(15.490459674, 6, -25.045388179), z_dir=(0, 1, 0)), keep=Keep.TOP, mode=Mode.PRIVATE)
    fillet_10_piece_5 = fillet_10_piece_5 - Plane(origin=(23, 10, -25.045388179), x_dir=(1, 0, 0), z_dir=(0, 0, -1)) * Cylinder(5, 125, mode=Mode.PRIVATE)
    fillet_10_piece_5 = split(fillet_10_piece_5, bisect_by=Plane(origin=(11.43, 6.408777733, -25.045388179), z_dir=(1, 0, 0)), keep=Keep.TOP, mode=Mode.PRIVATE)
    fillet_10_piece_5 = split(fillet_10_piece_5, bisect_by=Plane(origin=(18.54084097, 9.45915903, -25.045388179), z_dir=(-0.7071067811865306, -0.7071067811865644, 0)), keep=Keep.TOP, mode=Mode.PRIVATE)
    add(fillet_10_piece_5)


solid = part.part
